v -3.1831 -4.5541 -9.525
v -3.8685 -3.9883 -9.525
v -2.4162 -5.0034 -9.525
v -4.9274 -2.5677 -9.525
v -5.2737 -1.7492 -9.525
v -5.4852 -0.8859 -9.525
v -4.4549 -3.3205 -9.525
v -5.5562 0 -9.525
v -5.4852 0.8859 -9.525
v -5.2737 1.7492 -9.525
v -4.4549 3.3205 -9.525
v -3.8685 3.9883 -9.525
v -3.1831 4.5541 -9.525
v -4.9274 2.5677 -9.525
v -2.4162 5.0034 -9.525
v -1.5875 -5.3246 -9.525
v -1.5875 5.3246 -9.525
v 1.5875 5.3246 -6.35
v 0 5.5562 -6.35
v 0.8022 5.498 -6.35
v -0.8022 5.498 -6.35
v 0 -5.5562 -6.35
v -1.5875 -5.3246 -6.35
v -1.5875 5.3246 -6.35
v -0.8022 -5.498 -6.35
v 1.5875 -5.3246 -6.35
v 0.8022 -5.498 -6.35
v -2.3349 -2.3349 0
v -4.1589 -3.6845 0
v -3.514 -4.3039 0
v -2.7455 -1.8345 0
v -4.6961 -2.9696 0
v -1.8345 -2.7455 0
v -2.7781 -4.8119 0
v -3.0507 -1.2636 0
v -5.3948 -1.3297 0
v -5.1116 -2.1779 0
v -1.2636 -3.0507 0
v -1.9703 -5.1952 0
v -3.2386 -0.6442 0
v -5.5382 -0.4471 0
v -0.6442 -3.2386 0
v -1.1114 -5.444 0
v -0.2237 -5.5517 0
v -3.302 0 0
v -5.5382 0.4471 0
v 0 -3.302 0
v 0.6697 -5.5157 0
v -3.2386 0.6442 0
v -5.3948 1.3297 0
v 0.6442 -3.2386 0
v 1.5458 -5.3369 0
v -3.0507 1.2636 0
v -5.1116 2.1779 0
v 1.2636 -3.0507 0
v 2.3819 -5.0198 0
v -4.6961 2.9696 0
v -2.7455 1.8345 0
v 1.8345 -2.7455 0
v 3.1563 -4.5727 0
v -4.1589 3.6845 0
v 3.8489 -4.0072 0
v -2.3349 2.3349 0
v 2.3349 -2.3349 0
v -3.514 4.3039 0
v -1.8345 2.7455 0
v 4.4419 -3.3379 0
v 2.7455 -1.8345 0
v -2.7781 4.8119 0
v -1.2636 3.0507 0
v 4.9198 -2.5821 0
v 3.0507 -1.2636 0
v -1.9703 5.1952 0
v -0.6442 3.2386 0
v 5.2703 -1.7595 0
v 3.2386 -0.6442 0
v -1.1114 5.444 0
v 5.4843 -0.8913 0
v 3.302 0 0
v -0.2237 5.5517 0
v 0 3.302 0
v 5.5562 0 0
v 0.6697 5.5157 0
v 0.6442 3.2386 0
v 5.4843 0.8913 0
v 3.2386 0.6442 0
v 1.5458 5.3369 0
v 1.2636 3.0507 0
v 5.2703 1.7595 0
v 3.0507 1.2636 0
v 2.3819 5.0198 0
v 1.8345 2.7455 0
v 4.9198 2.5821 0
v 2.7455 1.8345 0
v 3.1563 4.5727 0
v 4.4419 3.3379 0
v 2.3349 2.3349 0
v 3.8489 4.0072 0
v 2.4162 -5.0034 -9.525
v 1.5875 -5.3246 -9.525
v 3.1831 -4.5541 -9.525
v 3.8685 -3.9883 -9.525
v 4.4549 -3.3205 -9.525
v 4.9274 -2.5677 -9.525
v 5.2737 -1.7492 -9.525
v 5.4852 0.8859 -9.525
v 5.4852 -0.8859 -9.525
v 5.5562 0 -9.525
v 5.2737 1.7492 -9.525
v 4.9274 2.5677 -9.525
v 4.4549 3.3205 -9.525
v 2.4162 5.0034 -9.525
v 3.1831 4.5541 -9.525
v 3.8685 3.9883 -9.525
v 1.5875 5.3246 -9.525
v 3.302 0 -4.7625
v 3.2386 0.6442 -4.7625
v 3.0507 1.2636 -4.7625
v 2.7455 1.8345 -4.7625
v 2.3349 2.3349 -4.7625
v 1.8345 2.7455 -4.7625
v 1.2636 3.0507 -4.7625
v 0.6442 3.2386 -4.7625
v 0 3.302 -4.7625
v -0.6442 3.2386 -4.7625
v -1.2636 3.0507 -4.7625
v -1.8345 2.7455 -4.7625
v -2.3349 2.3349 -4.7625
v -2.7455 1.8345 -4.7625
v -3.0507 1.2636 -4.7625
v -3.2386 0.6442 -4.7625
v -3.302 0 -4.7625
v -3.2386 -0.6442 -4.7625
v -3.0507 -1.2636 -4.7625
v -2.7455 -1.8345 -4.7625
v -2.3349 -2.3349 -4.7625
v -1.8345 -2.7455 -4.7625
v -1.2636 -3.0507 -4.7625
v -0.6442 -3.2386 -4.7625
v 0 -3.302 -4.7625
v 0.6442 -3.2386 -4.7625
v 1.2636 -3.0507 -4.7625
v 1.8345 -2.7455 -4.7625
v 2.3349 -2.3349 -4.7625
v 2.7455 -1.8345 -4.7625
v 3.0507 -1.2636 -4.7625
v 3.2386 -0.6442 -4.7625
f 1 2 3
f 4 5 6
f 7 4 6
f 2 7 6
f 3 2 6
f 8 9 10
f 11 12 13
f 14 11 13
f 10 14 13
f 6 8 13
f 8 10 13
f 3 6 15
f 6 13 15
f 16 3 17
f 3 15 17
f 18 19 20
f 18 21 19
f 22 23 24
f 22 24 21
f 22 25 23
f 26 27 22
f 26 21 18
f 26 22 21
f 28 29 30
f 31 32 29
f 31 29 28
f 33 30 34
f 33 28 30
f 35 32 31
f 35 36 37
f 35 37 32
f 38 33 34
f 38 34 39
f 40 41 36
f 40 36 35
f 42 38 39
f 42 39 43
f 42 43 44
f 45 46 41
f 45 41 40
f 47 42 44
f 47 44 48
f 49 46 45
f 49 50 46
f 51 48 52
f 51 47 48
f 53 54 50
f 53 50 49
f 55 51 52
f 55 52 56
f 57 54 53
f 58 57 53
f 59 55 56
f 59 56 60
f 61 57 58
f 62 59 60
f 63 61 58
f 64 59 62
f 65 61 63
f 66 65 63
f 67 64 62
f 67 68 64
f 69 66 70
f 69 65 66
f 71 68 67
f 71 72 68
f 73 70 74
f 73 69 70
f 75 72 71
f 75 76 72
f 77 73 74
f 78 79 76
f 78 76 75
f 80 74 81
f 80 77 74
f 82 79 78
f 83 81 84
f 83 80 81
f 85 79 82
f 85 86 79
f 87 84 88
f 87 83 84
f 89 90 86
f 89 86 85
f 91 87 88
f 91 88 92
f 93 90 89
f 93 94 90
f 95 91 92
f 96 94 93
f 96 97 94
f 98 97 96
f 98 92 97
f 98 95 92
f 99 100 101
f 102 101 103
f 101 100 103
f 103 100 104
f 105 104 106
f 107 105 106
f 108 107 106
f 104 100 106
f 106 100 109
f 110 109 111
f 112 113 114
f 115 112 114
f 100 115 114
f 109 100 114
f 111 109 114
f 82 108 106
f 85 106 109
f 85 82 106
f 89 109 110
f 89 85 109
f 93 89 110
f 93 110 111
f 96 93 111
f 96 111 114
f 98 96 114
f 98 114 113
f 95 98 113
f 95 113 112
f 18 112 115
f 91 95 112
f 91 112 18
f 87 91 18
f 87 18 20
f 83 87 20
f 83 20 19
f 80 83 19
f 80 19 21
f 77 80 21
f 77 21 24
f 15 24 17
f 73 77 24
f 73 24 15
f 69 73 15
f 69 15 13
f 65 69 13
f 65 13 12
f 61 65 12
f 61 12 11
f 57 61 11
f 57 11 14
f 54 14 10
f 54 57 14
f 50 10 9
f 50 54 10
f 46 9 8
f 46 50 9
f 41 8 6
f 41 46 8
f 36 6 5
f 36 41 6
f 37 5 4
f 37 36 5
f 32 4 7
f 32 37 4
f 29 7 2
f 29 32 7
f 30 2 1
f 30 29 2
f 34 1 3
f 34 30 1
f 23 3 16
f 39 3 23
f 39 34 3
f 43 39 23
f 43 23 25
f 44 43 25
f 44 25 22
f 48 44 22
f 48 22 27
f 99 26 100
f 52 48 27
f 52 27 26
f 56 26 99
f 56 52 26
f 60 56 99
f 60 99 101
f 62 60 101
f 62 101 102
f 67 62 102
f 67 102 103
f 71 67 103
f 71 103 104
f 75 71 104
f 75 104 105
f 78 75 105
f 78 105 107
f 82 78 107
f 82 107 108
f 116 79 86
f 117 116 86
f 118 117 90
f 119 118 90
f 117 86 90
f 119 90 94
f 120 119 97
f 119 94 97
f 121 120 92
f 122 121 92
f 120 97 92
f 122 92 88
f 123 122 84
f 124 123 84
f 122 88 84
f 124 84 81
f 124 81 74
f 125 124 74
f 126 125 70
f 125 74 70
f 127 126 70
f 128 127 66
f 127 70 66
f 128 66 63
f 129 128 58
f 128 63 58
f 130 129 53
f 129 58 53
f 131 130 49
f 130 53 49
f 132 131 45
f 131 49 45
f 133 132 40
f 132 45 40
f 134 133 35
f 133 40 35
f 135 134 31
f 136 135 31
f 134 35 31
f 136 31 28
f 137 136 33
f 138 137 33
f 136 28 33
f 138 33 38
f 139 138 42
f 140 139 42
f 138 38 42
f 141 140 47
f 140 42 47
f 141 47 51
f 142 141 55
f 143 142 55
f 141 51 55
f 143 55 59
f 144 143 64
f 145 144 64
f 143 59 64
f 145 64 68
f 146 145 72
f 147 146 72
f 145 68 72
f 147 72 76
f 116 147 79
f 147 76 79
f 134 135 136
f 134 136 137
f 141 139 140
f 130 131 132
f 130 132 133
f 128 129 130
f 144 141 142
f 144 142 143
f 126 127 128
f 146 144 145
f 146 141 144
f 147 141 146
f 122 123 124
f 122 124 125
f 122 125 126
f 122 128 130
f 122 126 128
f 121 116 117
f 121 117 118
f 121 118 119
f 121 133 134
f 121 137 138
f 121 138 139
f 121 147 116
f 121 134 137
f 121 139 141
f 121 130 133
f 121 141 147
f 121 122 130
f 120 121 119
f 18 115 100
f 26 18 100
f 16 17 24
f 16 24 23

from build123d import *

# Parameters (mm, degrees)
F0_R     = 5.55625
F1_DEPTH = 9.525
F2_W     = 3.175
F2_H     = 11.1125
F3_DEPTH = 3.175
F4_R     = 3.302
F5_DEPTH = 4.7625


with BuildPart() as f1:
    # F0 (on Top) → F1 (new body)
    with BuildSketch(Plane.XY):
        Circle(F0_R)
    extrude(amount=-F1_DEPTH)

    # F2 (on face) → F3 (cut)
    with BuildSketch(Plane(origin=(0, 0, -9.525), x_dir=(1, 0, 0), z_dir=(0, 0, -1))):
        Rectangle(F2_W, F2_H)
    extrude(amount=-F3_DEPTH, mode=Mode.SUBTRACT)

    # F4 (on face) → F5 (cut)
    with BuildSketch(Plane.XY):
        Circle(F4_R)
    extrude(amount=-F5_DEPTH, mode=Mode.SUBTRACT)


solid = f1.part
